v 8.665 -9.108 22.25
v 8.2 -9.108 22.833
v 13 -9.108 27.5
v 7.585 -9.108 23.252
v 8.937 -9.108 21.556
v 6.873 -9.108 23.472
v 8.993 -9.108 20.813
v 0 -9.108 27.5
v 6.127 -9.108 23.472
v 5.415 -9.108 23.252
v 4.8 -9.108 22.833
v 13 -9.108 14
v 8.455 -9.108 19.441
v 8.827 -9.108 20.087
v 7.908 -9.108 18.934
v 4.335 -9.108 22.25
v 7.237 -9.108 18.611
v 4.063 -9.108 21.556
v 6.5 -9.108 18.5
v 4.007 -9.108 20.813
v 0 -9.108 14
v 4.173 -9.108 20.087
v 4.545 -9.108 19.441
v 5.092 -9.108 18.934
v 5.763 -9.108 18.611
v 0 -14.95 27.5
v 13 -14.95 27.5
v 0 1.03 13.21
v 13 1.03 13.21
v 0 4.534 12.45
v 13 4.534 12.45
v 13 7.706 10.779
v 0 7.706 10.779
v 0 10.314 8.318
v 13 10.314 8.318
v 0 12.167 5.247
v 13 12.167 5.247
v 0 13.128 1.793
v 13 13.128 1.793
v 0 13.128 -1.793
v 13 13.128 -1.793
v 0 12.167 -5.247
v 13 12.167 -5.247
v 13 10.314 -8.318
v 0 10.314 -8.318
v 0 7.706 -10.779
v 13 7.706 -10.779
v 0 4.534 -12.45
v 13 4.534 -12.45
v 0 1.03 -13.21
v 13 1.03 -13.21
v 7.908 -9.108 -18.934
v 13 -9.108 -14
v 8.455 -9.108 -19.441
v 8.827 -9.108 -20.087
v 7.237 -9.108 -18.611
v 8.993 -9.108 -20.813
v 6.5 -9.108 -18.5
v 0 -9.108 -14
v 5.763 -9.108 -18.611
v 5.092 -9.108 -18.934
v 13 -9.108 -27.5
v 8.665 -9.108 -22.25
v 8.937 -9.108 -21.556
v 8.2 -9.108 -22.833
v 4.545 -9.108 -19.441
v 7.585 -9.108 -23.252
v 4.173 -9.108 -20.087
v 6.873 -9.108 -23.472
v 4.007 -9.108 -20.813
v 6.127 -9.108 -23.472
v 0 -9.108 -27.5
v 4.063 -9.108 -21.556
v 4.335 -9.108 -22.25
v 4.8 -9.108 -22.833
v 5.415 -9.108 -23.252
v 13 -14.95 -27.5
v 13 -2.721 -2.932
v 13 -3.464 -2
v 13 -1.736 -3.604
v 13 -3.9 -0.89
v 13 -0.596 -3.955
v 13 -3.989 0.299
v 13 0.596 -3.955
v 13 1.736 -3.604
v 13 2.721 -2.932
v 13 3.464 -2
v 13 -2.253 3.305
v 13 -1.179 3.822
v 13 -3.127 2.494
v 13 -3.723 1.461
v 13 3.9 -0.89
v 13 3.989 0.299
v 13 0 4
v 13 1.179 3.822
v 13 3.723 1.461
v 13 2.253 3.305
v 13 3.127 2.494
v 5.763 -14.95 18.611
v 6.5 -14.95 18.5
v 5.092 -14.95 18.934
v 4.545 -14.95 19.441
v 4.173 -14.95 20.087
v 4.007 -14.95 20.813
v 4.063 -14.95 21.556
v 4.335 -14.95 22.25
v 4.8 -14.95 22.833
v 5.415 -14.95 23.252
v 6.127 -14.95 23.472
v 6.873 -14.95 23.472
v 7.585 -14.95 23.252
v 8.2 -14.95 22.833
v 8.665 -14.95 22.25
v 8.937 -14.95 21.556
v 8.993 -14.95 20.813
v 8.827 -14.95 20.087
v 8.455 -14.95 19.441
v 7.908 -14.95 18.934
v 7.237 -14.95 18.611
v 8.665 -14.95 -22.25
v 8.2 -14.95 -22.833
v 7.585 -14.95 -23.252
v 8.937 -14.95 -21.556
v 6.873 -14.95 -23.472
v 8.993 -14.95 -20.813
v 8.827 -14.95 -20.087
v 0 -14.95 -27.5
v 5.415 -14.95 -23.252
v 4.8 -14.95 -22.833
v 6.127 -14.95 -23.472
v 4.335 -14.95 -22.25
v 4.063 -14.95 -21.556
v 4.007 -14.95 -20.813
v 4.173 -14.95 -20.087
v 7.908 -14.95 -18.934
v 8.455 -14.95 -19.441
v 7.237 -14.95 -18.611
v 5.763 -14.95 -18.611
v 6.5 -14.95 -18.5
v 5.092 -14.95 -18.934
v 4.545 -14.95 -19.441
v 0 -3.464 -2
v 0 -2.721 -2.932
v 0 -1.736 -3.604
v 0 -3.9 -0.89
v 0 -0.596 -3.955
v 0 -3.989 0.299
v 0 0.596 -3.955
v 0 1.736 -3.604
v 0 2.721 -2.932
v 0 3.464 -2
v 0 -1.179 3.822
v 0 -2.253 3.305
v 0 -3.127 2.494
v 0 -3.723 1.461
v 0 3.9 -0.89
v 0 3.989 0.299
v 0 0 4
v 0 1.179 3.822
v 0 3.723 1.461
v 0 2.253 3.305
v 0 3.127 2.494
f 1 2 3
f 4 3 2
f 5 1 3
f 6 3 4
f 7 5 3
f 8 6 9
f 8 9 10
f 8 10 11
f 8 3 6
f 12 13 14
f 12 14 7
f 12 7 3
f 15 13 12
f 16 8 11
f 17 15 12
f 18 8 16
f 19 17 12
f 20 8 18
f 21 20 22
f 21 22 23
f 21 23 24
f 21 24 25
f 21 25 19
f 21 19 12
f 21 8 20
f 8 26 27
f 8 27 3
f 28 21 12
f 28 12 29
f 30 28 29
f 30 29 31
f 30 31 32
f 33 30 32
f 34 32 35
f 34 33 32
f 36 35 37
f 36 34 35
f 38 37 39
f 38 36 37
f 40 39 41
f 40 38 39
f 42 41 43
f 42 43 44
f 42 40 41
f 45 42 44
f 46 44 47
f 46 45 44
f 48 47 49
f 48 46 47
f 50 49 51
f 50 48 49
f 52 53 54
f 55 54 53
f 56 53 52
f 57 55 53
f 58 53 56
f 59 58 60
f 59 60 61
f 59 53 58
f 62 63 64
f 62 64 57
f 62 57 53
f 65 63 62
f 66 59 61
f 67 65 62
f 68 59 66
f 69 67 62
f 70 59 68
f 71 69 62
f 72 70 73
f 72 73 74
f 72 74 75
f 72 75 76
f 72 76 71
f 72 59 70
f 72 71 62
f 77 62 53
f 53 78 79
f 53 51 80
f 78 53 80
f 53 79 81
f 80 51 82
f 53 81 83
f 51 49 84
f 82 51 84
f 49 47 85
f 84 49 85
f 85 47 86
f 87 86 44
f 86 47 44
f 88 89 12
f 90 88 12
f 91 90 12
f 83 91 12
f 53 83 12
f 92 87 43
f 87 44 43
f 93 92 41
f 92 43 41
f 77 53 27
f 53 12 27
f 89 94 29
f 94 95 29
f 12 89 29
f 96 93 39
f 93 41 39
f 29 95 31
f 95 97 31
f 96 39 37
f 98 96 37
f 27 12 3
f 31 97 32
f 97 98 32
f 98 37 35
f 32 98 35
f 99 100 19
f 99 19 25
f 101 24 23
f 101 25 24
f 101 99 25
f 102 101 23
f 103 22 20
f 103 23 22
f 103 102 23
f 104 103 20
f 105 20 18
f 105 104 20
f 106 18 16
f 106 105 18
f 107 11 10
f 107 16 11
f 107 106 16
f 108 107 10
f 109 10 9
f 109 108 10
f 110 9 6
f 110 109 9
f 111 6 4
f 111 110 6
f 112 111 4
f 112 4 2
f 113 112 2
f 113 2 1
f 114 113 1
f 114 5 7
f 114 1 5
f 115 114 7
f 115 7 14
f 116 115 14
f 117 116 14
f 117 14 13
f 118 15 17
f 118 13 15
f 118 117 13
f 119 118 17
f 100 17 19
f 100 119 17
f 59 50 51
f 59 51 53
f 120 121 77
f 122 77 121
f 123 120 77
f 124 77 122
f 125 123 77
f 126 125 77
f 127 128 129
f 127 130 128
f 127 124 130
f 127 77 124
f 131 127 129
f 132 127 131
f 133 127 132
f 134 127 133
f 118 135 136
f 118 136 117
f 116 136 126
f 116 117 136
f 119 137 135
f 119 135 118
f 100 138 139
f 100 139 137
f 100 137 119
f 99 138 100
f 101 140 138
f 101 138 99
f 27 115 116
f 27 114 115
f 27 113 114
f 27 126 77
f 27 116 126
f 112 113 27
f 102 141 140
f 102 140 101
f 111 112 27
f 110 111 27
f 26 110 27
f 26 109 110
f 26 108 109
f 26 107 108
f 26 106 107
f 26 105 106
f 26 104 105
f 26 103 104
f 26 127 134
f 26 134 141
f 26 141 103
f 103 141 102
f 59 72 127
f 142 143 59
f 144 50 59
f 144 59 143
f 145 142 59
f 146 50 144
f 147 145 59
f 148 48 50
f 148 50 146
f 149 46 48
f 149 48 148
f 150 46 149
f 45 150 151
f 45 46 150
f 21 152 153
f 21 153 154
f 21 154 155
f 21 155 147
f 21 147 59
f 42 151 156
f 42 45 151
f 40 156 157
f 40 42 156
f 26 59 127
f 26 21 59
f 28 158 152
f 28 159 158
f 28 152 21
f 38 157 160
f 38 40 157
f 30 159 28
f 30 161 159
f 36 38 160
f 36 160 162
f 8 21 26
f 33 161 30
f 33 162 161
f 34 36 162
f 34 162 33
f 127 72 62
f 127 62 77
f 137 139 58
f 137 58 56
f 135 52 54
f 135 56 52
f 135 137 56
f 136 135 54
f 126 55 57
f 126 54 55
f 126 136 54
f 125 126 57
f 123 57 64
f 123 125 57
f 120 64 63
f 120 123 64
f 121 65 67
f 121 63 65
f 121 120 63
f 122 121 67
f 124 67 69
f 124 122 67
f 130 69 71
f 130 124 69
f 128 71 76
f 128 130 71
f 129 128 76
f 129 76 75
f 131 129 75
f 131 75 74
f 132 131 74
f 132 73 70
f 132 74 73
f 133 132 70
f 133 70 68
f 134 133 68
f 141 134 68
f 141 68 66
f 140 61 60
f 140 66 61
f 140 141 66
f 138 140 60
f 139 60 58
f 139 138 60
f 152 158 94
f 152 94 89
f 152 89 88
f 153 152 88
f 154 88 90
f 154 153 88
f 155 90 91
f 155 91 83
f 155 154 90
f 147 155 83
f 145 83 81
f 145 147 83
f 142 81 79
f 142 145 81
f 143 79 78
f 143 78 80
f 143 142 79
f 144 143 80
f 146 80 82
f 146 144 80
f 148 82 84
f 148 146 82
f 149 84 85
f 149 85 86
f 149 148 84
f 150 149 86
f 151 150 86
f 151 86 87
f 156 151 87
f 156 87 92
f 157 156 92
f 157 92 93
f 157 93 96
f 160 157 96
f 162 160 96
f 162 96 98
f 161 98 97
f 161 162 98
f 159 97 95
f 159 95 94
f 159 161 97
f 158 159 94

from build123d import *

# Parameters (mm, degrees)
SKETCH1_R               = 4
BOSS_EXTRUDE1_DEPTH     = 13
CUT_EXTRUDE1_DEPTH      = 38.750758176
CUT_EXTRUDE1_DEPTH_BACK = 38.750758176
SKETCH2_R               = 2.5


with BuildPart() as part:
    # Sketch1 → Boss-Extrude1 (new body)
    with BuildSketch(Plane(origin=(0, 0, 0), x_dir=(0, 0, -1), z_dir=(1, 0, 0))):
        with BuildLine():
            Line((27.5, -14.95), (-27.5, -14.95))
            Line((-27.5, -14.95), (-27.5, -9.107766946))
            Line((-27.5, -9.107766946), (-14, -9.107766946))
            Line((-14, -9.107766946), (-13.209942251, 1.029526948))
            ThreePointArc((-13.209942251, 1.029526948), (0, 13.25), (13.209942251, 1.029526948))
            Line((13.209942251, 1.029526948), (14, -9.107766946))
            Line((14, -9.107766946), (27.5, -9.107766946))
            Line((27.5, -9.107766946), (27.5, -14.95))
        make_face()
        with Locations(Location((0, 0, 0), (0, 0, 180))):
            Circle(SKETCH1_R, mode=Mode.SUBTRACT)
    extrude(amount=BOSS_EXTRUDE1_DEPTH)

    # Sketch2 → Cut-Extrude1 (cut, two sides: drawn at the far end of the back side and taken through both)
    with BuildSketch(Plane(origin=(0, -9.107766946, 0), x_dir=(1, 0, 0), z_dir=(0, 1, 0)).offset(-CUT_EXTRUDE1_DEPTH_BACK)):
        with Locations(Location((6.5, 21, 0), (0, 0, 270))):
            Circle(SKETCH2_R)
        with Locations(Location((6.5, -21, 0), (0, 0, 90))):
            Circle(SKETCH2_R)
    extrude(amount=CUT_EXTRUDE1_DEPTH + CUT_EXTRUDE1_DEPTH_BACK, mode=Mode.SUBTRACT)


solid = part.part
